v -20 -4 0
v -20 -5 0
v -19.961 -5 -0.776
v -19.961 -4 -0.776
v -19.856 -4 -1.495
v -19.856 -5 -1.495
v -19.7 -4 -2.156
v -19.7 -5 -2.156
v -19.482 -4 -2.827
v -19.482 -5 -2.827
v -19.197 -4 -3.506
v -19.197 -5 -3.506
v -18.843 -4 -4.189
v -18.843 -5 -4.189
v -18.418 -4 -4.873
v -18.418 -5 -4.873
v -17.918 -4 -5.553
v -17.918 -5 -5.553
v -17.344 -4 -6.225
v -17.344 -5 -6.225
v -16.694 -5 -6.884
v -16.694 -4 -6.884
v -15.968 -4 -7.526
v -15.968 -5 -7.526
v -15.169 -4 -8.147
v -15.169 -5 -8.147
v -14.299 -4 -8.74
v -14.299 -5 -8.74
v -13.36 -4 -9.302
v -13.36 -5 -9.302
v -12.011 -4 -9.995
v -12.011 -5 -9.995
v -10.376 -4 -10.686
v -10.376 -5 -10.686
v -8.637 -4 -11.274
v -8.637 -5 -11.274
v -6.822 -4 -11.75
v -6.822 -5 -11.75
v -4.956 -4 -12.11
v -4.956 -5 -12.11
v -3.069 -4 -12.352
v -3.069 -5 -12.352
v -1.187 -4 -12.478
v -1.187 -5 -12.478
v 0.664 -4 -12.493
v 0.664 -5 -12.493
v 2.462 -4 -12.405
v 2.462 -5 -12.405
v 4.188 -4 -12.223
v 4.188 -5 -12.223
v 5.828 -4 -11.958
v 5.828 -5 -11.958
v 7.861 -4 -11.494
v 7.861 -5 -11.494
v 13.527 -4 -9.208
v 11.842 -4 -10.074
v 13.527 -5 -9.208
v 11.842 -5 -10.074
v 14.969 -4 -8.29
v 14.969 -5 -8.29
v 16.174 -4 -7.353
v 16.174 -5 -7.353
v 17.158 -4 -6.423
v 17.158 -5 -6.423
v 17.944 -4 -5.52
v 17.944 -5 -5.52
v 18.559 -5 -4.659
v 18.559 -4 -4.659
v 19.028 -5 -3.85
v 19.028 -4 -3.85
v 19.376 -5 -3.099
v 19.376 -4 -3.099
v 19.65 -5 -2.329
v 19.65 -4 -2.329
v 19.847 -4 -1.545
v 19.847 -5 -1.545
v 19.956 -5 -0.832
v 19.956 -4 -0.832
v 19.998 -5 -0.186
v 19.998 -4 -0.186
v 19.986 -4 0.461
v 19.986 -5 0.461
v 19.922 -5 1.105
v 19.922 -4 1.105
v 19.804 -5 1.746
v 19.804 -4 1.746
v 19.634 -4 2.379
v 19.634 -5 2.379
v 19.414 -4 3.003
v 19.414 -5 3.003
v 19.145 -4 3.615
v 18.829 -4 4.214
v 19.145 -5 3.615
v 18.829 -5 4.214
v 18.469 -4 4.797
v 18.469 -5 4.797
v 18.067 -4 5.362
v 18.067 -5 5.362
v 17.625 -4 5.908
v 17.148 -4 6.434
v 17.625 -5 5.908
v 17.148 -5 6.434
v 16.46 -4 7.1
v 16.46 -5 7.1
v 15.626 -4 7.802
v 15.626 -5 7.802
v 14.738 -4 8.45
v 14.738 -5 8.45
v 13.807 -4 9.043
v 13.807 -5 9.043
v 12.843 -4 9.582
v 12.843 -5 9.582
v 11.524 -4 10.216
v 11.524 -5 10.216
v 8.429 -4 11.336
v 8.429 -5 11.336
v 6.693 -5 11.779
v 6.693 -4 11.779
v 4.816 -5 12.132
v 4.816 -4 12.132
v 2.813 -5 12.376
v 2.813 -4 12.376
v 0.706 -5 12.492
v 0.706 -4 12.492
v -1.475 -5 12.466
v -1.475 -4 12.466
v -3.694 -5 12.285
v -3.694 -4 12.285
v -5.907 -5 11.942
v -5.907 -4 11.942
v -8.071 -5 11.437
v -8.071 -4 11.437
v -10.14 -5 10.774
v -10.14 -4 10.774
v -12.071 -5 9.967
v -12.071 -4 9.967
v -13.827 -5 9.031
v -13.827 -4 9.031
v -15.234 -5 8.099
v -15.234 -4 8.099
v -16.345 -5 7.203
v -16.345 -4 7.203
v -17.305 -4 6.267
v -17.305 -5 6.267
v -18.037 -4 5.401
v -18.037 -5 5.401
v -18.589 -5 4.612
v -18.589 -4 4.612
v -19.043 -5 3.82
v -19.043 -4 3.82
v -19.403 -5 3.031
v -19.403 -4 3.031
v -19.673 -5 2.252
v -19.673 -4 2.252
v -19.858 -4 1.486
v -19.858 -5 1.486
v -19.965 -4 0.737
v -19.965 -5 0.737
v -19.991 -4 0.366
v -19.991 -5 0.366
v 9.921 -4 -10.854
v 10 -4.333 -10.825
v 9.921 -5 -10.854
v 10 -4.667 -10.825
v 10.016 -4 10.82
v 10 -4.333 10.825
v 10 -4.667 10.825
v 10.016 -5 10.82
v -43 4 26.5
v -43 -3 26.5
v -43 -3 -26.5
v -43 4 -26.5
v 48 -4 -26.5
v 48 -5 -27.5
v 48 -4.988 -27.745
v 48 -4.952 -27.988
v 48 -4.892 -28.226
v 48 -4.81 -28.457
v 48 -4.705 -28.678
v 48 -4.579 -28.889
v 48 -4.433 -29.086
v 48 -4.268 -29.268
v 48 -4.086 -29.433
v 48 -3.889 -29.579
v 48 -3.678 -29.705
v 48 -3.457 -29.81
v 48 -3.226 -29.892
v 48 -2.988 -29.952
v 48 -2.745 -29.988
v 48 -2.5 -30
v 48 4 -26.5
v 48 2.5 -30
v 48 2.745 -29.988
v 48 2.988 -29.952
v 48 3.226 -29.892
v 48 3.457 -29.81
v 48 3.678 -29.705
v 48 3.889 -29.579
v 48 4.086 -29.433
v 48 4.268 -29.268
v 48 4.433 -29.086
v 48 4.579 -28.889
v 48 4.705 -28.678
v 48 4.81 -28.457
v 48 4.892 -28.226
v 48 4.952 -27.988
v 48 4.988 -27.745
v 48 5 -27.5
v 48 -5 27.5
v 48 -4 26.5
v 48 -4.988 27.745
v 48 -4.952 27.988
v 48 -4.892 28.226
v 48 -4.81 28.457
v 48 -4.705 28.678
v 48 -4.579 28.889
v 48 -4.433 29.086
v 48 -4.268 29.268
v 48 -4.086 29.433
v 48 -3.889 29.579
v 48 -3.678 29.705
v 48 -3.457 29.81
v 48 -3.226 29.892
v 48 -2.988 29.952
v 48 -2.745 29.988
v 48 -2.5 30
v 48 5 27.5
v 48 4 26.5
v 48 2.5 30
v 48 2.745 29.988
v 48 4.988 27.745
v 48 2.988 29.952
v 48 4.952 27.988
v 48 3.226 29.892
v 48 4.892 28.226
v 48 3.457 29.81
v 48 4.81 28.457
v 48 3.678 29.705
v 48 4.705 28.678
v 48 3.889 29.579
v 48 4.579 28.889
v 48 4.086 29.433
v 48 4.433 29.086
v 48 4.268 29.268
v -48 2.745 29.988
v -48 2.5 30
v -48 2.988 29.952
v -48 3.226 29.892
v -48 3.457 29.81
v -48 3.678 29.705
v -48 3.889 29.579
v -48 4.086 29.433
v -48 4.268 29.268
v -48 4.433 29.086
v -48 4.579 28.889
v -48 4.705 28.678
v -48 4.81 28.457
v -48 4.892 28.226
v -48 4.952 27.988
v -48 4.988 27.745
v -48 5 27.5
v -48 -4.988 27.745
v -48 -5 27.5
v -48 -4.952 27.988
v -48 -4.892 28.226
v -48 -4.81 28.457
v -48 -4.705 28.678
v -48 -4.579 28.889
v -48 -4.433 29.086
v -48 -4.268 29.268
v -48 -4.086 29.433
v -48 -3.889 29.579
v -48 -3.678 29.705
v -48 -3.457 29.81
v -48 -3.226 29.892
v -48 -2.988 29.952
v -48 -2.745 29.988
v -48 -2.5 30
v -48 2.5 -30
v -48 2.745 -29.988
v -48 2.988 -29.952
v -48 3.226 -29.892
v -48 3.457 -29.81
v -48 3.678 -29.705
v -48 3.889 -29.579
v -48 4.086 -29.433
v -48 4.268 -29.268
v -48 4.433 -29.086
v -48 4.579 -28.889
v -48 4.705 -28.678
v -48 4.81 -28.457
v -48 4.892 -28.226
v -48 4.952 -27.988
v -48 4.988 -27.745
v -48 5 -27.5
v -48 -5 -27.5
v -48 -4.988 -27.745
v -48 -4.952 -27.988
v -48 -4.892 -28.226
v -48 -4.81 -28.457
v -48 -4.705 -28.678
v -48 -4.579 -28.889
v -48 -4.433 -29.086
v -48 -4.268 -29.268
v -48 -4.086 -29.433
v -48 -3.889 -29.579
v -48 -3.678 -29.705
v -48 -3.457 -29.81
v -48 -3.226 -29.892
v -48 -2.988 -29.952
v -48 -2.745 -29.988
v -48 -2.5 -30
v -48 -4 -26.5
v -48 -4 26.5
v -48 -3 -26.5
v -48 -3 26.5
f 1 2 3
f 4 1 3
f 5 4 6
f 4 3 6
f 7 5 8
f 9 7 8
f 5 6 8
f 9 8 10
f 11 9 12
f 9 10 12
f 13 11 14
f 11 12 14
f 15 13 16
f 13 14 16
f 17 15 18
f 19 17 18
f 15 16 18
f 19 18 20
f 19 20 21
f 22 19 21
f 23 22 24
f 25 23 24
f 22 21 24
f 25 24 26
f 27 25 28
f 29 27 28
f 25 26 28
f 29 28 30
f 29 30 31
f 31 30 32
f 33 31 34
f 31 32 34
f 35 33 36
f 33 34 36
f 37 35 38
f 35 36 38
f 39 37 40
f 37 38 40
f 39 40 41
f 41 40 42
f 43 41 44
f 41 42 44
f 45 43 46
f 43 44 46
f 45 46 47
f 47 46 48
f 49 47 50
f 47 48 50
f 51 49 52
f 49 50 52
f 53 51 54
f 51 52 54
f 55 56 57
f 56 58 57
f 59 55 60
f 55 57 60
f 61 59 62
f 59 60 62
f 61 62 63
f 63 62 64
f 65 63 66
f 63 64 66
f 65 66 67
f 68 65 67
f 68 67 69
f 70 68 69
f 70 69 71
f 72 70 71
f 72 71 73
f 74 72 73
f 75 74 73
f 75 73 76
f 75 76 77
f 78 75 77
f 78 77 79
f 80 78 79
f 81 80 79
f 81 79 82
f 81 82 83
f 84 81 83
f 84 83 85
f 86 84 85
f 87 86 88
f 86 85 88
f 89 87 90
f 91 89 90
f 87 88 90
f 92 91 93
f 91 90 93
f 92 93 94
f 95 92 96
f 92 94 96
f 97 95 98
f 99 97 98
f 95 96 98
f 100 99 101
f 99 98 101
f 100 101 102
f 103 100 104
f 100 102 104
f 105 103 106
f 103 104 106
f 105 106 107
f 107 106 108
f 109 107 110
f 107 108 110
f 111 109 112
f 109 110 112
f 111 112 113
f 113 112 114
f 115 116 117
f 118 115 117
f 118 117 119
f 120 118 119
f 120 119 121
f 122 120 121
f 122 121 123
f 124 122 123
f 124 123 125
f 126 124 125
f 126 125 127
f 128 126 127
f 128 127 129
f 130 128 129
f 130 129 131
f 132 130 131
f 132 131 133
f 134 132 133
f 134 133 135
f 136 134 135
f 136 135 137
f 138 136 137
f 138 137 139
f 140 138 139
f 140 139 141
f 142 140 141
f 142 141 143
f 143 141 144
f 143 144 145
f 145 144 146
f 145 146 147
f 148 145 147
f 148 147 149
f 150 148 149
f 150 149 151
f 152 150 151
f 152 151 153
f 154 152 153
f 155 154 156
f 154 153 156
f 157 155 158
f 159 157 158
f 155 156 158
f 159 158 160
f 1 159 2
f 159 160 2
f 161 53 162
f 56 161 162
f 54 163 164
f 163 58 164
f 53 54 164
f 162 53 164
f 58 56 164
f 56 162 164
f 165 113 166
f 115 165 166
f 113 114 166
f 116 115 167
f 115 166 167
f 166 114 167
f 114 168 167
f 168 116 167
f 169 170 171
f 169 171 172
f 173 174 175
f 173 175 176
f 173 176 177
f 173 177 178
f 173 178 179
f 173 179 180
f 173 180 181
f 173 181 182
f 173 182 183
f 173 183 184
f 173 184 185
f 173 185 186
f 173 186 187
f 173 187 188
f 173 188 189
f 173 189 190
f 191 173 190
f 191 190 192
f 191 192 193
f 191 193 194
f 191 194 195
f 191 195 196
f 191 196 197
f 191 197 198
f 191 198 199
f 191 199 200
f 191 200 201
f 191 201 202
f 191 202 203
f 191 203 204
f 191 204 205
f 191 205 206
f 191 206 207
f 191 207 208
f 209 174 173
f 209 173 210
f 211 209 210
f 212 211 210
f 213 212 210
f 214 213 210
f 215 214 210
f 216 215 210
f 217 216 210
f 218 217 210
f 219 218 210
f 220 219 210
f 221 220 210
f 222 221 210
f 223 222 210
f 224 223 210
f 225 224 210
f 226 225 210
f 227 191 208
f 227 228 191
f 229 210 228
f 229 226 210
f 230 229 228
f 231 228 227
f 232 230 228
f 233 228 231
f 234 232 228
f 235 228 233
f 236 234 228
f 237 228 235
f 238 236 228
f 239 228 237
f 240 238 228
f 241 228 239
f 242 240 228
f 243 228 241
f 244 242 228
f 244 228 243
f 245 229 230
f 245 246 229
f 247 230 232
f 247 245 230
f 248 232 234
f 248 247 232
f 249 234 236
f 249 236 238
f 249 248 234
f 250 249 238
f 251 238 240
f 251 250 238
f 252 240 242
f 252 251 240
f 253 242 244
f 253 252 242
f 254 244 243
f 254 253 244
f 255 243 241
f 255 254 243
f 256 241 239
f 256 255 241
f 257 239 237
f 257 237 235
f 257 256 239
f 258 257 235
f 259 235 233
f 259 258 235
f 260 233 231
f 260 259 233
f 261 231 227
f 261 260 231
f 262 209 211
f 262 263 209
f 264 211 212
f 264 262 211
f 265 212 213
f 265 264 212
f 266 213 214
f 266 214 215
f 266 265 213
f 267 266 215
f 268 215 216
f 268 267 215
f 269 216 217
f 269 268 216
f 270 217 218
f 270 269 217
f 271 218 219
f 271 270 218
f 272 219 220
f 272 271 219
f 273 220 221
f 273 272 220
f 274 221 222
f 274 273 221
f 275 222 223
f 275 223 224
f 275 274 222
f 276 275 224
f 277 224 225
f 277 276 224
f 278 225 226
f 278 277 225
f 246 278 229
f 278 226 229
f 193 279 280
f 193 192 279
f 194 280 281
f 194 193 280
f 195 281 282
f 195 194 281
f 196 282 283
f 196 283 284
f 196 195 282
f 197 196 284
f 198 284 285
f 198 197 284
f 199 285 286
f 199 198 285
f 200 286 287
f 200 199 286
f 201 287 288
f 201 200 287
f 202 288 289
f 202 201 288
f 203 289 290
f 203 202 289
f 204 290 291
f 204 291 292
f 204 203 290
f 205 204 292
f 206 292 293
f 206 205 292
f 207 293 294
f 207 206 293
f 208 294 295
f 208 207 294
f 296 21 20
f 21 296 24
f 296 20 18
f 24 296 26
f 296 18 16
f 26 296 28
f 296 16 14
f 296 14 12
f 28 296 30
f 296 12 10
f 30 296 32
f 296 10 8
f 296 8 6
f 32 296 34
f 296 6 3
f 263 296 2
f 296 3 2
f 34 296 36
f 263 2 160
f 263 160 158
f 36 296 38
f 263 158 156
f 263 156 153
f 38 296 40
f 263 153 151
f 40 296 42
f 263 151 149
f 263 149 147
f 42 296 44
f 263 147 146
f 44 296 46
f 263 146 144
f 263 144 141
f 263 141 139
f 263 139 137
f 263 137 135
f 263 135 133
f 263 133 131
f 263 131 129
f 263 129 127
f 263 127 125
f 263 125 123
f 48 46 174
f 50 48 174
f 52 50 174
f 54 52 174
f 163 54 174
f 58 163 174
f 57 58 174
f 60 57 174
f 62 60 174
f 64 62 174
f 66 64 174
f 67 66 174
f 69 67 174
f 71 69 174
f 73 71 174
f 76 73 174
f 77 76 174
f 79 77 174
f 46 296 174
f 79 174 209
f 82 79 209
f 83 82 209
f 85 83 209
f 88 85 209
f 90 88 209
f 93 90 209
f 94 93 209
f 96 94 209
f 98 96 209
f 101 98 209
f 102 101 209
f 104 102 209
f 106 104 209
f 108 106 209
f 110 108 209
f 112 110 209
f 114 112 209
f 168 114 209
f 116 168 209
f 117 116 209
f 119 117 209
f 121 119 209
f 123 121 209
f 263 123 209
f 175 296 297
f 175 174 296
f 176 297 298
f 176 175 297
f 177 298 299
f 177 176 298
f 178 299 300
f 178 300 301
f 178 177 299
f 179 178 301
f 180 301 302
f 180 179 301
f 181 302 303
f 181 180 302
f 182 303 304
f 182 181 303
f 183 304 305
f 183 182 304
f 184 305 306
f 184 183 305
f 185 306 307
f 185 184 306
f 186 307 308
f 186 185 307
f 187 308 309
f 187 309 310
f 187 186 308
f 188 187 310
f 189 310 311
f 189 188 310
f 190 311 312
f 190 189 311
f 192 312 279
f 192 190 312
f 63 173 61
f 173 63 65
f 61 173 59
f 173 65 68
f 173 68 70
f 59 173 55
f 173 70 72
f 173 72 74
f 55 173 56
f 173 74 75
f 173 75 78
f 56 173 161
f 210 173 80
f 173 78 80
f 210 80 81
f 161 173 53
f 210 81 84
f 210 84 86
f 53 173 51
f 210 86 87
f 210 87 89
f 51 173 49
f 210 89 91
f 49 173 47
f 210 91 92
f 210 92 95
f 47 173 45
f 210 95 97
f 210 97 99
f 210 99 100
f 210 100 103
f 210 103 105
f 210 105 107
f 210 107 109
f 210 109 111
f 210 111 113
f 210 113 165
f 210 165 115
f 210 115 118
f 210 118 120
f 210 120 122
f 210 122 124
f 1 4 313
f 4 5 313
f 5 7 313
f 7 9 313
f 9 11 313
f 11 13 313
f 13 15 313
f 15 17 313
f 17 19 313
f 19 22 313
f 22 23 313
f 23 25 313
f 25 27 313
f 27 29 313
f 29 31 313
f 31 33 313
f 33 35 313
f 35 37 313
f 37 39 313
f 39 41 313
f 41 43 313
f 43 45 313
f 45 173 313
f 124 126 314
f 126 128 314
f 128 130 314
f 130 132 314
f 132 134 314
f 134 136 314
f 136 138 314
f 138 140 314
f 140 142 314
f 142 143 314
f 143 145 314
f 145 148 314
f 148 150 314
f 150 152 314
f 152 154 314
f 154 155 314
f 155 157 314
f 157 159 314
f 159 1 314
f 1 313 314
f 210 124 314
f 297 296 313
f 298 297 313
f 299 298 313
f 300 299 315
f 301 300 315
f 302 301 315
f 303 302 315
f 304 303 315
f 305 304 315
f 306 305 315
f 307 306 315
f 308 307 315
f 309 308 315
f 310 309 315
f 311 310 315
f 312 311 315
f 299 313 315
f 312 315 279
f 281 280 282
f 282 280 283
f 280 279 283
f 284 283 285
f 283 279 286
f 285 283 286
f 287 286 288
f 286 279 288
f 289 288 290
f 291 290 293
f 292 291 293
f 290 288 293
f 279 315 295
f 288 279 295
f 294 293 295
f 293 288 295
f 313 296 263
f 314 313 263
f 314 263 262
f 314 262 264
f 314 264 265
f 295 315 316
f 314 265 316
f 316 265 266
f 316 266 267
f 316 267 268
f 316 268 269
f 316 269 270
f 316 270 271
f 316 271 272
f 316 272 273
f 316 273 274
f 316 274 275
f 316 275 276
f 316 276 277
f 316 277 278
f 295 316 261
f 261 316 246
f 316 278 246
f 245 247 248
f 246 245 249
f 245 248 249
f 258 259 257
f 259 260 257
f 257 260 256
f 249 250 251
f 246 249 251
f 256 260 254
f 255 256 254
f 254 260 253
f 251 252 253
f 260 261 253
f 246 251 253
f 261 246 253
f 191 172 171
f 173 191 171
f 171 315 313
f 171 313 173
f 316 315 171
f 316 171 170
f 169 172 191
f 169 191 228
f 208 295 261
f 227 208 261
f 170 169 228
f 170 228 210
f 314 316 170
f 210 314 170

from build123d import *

# Parameters (mm, degrees)
F0_W     = 10
F0_H     = 60
F1_DEPTH = 48
F2_W     = 8
F2_H     = 53
F3_DEPTH = 91
F4_W     = 1
F4_H     = 53
F5_DEPTH = 5
F7_DEPTH = 1
F8_R     = 2.5


with BuildPart() as f1:
    # F0 (on Right) → F1 (new body, symmetric)
    with BuildSketch(Plane.YZ):
        Rectangle(F0_W, F0_H)
    extrude(amount=F1_DEPTH, both=True)

    # F2 (on face) → F3 (cut)
    with BuildSketch(Plane.YZ.offset(48)):
        Rectangle(F2_W, F2_H)
    extrude(amount=-F3_DEPTH, mode=Mode.SUBTRACT)

    # F4 (on face) → F5 (cut, through all)
    with BuildSketch(Plane(origin=(-48, 0, 0), x_dir=(0, -1, 0), z_dir=(-1, 0, 0))):
        with Locations((3.5, 0)):
            Rectangle(F4_W, F4_H)
    extrude(amount=-F5_DEPTH, mode=Mode.SUBTRACT)

    # F6 (on face) → F7 (cut, through all)
    with BuildSketch(Plane.XZ.offset(5)):
        with BuildLine():
            add(Edge.make_bspline(
                [(-20, 0), (-20, -21.650635), (10, -10.825318), (40, 0), (10, 10.825318), (-20, 21.650635), (-20, 0)],
                knots=[0, 0, 0, 2.094395, 2.094395, 4.18879, 4.18879, 6.283185, 6.283185, 6.283185], degree=2, weights=[1, 0.5, 1, 0.5, 1, 0.5, 1]))
        make_face()
    extrude(amount=-F7_DEPTH, mode=Mode.SUBTRACT)

    # F8
    f8_edges = [f1.edges().sort_by_distance(p)[0] for p in [
        (0, 5, 30),
        (0, -5, 30),
        (0, -5, -30),
        (0, 5, -30),
    ]]
    fillet(f8_edges, radius=F8_R)


solid = f1.part
